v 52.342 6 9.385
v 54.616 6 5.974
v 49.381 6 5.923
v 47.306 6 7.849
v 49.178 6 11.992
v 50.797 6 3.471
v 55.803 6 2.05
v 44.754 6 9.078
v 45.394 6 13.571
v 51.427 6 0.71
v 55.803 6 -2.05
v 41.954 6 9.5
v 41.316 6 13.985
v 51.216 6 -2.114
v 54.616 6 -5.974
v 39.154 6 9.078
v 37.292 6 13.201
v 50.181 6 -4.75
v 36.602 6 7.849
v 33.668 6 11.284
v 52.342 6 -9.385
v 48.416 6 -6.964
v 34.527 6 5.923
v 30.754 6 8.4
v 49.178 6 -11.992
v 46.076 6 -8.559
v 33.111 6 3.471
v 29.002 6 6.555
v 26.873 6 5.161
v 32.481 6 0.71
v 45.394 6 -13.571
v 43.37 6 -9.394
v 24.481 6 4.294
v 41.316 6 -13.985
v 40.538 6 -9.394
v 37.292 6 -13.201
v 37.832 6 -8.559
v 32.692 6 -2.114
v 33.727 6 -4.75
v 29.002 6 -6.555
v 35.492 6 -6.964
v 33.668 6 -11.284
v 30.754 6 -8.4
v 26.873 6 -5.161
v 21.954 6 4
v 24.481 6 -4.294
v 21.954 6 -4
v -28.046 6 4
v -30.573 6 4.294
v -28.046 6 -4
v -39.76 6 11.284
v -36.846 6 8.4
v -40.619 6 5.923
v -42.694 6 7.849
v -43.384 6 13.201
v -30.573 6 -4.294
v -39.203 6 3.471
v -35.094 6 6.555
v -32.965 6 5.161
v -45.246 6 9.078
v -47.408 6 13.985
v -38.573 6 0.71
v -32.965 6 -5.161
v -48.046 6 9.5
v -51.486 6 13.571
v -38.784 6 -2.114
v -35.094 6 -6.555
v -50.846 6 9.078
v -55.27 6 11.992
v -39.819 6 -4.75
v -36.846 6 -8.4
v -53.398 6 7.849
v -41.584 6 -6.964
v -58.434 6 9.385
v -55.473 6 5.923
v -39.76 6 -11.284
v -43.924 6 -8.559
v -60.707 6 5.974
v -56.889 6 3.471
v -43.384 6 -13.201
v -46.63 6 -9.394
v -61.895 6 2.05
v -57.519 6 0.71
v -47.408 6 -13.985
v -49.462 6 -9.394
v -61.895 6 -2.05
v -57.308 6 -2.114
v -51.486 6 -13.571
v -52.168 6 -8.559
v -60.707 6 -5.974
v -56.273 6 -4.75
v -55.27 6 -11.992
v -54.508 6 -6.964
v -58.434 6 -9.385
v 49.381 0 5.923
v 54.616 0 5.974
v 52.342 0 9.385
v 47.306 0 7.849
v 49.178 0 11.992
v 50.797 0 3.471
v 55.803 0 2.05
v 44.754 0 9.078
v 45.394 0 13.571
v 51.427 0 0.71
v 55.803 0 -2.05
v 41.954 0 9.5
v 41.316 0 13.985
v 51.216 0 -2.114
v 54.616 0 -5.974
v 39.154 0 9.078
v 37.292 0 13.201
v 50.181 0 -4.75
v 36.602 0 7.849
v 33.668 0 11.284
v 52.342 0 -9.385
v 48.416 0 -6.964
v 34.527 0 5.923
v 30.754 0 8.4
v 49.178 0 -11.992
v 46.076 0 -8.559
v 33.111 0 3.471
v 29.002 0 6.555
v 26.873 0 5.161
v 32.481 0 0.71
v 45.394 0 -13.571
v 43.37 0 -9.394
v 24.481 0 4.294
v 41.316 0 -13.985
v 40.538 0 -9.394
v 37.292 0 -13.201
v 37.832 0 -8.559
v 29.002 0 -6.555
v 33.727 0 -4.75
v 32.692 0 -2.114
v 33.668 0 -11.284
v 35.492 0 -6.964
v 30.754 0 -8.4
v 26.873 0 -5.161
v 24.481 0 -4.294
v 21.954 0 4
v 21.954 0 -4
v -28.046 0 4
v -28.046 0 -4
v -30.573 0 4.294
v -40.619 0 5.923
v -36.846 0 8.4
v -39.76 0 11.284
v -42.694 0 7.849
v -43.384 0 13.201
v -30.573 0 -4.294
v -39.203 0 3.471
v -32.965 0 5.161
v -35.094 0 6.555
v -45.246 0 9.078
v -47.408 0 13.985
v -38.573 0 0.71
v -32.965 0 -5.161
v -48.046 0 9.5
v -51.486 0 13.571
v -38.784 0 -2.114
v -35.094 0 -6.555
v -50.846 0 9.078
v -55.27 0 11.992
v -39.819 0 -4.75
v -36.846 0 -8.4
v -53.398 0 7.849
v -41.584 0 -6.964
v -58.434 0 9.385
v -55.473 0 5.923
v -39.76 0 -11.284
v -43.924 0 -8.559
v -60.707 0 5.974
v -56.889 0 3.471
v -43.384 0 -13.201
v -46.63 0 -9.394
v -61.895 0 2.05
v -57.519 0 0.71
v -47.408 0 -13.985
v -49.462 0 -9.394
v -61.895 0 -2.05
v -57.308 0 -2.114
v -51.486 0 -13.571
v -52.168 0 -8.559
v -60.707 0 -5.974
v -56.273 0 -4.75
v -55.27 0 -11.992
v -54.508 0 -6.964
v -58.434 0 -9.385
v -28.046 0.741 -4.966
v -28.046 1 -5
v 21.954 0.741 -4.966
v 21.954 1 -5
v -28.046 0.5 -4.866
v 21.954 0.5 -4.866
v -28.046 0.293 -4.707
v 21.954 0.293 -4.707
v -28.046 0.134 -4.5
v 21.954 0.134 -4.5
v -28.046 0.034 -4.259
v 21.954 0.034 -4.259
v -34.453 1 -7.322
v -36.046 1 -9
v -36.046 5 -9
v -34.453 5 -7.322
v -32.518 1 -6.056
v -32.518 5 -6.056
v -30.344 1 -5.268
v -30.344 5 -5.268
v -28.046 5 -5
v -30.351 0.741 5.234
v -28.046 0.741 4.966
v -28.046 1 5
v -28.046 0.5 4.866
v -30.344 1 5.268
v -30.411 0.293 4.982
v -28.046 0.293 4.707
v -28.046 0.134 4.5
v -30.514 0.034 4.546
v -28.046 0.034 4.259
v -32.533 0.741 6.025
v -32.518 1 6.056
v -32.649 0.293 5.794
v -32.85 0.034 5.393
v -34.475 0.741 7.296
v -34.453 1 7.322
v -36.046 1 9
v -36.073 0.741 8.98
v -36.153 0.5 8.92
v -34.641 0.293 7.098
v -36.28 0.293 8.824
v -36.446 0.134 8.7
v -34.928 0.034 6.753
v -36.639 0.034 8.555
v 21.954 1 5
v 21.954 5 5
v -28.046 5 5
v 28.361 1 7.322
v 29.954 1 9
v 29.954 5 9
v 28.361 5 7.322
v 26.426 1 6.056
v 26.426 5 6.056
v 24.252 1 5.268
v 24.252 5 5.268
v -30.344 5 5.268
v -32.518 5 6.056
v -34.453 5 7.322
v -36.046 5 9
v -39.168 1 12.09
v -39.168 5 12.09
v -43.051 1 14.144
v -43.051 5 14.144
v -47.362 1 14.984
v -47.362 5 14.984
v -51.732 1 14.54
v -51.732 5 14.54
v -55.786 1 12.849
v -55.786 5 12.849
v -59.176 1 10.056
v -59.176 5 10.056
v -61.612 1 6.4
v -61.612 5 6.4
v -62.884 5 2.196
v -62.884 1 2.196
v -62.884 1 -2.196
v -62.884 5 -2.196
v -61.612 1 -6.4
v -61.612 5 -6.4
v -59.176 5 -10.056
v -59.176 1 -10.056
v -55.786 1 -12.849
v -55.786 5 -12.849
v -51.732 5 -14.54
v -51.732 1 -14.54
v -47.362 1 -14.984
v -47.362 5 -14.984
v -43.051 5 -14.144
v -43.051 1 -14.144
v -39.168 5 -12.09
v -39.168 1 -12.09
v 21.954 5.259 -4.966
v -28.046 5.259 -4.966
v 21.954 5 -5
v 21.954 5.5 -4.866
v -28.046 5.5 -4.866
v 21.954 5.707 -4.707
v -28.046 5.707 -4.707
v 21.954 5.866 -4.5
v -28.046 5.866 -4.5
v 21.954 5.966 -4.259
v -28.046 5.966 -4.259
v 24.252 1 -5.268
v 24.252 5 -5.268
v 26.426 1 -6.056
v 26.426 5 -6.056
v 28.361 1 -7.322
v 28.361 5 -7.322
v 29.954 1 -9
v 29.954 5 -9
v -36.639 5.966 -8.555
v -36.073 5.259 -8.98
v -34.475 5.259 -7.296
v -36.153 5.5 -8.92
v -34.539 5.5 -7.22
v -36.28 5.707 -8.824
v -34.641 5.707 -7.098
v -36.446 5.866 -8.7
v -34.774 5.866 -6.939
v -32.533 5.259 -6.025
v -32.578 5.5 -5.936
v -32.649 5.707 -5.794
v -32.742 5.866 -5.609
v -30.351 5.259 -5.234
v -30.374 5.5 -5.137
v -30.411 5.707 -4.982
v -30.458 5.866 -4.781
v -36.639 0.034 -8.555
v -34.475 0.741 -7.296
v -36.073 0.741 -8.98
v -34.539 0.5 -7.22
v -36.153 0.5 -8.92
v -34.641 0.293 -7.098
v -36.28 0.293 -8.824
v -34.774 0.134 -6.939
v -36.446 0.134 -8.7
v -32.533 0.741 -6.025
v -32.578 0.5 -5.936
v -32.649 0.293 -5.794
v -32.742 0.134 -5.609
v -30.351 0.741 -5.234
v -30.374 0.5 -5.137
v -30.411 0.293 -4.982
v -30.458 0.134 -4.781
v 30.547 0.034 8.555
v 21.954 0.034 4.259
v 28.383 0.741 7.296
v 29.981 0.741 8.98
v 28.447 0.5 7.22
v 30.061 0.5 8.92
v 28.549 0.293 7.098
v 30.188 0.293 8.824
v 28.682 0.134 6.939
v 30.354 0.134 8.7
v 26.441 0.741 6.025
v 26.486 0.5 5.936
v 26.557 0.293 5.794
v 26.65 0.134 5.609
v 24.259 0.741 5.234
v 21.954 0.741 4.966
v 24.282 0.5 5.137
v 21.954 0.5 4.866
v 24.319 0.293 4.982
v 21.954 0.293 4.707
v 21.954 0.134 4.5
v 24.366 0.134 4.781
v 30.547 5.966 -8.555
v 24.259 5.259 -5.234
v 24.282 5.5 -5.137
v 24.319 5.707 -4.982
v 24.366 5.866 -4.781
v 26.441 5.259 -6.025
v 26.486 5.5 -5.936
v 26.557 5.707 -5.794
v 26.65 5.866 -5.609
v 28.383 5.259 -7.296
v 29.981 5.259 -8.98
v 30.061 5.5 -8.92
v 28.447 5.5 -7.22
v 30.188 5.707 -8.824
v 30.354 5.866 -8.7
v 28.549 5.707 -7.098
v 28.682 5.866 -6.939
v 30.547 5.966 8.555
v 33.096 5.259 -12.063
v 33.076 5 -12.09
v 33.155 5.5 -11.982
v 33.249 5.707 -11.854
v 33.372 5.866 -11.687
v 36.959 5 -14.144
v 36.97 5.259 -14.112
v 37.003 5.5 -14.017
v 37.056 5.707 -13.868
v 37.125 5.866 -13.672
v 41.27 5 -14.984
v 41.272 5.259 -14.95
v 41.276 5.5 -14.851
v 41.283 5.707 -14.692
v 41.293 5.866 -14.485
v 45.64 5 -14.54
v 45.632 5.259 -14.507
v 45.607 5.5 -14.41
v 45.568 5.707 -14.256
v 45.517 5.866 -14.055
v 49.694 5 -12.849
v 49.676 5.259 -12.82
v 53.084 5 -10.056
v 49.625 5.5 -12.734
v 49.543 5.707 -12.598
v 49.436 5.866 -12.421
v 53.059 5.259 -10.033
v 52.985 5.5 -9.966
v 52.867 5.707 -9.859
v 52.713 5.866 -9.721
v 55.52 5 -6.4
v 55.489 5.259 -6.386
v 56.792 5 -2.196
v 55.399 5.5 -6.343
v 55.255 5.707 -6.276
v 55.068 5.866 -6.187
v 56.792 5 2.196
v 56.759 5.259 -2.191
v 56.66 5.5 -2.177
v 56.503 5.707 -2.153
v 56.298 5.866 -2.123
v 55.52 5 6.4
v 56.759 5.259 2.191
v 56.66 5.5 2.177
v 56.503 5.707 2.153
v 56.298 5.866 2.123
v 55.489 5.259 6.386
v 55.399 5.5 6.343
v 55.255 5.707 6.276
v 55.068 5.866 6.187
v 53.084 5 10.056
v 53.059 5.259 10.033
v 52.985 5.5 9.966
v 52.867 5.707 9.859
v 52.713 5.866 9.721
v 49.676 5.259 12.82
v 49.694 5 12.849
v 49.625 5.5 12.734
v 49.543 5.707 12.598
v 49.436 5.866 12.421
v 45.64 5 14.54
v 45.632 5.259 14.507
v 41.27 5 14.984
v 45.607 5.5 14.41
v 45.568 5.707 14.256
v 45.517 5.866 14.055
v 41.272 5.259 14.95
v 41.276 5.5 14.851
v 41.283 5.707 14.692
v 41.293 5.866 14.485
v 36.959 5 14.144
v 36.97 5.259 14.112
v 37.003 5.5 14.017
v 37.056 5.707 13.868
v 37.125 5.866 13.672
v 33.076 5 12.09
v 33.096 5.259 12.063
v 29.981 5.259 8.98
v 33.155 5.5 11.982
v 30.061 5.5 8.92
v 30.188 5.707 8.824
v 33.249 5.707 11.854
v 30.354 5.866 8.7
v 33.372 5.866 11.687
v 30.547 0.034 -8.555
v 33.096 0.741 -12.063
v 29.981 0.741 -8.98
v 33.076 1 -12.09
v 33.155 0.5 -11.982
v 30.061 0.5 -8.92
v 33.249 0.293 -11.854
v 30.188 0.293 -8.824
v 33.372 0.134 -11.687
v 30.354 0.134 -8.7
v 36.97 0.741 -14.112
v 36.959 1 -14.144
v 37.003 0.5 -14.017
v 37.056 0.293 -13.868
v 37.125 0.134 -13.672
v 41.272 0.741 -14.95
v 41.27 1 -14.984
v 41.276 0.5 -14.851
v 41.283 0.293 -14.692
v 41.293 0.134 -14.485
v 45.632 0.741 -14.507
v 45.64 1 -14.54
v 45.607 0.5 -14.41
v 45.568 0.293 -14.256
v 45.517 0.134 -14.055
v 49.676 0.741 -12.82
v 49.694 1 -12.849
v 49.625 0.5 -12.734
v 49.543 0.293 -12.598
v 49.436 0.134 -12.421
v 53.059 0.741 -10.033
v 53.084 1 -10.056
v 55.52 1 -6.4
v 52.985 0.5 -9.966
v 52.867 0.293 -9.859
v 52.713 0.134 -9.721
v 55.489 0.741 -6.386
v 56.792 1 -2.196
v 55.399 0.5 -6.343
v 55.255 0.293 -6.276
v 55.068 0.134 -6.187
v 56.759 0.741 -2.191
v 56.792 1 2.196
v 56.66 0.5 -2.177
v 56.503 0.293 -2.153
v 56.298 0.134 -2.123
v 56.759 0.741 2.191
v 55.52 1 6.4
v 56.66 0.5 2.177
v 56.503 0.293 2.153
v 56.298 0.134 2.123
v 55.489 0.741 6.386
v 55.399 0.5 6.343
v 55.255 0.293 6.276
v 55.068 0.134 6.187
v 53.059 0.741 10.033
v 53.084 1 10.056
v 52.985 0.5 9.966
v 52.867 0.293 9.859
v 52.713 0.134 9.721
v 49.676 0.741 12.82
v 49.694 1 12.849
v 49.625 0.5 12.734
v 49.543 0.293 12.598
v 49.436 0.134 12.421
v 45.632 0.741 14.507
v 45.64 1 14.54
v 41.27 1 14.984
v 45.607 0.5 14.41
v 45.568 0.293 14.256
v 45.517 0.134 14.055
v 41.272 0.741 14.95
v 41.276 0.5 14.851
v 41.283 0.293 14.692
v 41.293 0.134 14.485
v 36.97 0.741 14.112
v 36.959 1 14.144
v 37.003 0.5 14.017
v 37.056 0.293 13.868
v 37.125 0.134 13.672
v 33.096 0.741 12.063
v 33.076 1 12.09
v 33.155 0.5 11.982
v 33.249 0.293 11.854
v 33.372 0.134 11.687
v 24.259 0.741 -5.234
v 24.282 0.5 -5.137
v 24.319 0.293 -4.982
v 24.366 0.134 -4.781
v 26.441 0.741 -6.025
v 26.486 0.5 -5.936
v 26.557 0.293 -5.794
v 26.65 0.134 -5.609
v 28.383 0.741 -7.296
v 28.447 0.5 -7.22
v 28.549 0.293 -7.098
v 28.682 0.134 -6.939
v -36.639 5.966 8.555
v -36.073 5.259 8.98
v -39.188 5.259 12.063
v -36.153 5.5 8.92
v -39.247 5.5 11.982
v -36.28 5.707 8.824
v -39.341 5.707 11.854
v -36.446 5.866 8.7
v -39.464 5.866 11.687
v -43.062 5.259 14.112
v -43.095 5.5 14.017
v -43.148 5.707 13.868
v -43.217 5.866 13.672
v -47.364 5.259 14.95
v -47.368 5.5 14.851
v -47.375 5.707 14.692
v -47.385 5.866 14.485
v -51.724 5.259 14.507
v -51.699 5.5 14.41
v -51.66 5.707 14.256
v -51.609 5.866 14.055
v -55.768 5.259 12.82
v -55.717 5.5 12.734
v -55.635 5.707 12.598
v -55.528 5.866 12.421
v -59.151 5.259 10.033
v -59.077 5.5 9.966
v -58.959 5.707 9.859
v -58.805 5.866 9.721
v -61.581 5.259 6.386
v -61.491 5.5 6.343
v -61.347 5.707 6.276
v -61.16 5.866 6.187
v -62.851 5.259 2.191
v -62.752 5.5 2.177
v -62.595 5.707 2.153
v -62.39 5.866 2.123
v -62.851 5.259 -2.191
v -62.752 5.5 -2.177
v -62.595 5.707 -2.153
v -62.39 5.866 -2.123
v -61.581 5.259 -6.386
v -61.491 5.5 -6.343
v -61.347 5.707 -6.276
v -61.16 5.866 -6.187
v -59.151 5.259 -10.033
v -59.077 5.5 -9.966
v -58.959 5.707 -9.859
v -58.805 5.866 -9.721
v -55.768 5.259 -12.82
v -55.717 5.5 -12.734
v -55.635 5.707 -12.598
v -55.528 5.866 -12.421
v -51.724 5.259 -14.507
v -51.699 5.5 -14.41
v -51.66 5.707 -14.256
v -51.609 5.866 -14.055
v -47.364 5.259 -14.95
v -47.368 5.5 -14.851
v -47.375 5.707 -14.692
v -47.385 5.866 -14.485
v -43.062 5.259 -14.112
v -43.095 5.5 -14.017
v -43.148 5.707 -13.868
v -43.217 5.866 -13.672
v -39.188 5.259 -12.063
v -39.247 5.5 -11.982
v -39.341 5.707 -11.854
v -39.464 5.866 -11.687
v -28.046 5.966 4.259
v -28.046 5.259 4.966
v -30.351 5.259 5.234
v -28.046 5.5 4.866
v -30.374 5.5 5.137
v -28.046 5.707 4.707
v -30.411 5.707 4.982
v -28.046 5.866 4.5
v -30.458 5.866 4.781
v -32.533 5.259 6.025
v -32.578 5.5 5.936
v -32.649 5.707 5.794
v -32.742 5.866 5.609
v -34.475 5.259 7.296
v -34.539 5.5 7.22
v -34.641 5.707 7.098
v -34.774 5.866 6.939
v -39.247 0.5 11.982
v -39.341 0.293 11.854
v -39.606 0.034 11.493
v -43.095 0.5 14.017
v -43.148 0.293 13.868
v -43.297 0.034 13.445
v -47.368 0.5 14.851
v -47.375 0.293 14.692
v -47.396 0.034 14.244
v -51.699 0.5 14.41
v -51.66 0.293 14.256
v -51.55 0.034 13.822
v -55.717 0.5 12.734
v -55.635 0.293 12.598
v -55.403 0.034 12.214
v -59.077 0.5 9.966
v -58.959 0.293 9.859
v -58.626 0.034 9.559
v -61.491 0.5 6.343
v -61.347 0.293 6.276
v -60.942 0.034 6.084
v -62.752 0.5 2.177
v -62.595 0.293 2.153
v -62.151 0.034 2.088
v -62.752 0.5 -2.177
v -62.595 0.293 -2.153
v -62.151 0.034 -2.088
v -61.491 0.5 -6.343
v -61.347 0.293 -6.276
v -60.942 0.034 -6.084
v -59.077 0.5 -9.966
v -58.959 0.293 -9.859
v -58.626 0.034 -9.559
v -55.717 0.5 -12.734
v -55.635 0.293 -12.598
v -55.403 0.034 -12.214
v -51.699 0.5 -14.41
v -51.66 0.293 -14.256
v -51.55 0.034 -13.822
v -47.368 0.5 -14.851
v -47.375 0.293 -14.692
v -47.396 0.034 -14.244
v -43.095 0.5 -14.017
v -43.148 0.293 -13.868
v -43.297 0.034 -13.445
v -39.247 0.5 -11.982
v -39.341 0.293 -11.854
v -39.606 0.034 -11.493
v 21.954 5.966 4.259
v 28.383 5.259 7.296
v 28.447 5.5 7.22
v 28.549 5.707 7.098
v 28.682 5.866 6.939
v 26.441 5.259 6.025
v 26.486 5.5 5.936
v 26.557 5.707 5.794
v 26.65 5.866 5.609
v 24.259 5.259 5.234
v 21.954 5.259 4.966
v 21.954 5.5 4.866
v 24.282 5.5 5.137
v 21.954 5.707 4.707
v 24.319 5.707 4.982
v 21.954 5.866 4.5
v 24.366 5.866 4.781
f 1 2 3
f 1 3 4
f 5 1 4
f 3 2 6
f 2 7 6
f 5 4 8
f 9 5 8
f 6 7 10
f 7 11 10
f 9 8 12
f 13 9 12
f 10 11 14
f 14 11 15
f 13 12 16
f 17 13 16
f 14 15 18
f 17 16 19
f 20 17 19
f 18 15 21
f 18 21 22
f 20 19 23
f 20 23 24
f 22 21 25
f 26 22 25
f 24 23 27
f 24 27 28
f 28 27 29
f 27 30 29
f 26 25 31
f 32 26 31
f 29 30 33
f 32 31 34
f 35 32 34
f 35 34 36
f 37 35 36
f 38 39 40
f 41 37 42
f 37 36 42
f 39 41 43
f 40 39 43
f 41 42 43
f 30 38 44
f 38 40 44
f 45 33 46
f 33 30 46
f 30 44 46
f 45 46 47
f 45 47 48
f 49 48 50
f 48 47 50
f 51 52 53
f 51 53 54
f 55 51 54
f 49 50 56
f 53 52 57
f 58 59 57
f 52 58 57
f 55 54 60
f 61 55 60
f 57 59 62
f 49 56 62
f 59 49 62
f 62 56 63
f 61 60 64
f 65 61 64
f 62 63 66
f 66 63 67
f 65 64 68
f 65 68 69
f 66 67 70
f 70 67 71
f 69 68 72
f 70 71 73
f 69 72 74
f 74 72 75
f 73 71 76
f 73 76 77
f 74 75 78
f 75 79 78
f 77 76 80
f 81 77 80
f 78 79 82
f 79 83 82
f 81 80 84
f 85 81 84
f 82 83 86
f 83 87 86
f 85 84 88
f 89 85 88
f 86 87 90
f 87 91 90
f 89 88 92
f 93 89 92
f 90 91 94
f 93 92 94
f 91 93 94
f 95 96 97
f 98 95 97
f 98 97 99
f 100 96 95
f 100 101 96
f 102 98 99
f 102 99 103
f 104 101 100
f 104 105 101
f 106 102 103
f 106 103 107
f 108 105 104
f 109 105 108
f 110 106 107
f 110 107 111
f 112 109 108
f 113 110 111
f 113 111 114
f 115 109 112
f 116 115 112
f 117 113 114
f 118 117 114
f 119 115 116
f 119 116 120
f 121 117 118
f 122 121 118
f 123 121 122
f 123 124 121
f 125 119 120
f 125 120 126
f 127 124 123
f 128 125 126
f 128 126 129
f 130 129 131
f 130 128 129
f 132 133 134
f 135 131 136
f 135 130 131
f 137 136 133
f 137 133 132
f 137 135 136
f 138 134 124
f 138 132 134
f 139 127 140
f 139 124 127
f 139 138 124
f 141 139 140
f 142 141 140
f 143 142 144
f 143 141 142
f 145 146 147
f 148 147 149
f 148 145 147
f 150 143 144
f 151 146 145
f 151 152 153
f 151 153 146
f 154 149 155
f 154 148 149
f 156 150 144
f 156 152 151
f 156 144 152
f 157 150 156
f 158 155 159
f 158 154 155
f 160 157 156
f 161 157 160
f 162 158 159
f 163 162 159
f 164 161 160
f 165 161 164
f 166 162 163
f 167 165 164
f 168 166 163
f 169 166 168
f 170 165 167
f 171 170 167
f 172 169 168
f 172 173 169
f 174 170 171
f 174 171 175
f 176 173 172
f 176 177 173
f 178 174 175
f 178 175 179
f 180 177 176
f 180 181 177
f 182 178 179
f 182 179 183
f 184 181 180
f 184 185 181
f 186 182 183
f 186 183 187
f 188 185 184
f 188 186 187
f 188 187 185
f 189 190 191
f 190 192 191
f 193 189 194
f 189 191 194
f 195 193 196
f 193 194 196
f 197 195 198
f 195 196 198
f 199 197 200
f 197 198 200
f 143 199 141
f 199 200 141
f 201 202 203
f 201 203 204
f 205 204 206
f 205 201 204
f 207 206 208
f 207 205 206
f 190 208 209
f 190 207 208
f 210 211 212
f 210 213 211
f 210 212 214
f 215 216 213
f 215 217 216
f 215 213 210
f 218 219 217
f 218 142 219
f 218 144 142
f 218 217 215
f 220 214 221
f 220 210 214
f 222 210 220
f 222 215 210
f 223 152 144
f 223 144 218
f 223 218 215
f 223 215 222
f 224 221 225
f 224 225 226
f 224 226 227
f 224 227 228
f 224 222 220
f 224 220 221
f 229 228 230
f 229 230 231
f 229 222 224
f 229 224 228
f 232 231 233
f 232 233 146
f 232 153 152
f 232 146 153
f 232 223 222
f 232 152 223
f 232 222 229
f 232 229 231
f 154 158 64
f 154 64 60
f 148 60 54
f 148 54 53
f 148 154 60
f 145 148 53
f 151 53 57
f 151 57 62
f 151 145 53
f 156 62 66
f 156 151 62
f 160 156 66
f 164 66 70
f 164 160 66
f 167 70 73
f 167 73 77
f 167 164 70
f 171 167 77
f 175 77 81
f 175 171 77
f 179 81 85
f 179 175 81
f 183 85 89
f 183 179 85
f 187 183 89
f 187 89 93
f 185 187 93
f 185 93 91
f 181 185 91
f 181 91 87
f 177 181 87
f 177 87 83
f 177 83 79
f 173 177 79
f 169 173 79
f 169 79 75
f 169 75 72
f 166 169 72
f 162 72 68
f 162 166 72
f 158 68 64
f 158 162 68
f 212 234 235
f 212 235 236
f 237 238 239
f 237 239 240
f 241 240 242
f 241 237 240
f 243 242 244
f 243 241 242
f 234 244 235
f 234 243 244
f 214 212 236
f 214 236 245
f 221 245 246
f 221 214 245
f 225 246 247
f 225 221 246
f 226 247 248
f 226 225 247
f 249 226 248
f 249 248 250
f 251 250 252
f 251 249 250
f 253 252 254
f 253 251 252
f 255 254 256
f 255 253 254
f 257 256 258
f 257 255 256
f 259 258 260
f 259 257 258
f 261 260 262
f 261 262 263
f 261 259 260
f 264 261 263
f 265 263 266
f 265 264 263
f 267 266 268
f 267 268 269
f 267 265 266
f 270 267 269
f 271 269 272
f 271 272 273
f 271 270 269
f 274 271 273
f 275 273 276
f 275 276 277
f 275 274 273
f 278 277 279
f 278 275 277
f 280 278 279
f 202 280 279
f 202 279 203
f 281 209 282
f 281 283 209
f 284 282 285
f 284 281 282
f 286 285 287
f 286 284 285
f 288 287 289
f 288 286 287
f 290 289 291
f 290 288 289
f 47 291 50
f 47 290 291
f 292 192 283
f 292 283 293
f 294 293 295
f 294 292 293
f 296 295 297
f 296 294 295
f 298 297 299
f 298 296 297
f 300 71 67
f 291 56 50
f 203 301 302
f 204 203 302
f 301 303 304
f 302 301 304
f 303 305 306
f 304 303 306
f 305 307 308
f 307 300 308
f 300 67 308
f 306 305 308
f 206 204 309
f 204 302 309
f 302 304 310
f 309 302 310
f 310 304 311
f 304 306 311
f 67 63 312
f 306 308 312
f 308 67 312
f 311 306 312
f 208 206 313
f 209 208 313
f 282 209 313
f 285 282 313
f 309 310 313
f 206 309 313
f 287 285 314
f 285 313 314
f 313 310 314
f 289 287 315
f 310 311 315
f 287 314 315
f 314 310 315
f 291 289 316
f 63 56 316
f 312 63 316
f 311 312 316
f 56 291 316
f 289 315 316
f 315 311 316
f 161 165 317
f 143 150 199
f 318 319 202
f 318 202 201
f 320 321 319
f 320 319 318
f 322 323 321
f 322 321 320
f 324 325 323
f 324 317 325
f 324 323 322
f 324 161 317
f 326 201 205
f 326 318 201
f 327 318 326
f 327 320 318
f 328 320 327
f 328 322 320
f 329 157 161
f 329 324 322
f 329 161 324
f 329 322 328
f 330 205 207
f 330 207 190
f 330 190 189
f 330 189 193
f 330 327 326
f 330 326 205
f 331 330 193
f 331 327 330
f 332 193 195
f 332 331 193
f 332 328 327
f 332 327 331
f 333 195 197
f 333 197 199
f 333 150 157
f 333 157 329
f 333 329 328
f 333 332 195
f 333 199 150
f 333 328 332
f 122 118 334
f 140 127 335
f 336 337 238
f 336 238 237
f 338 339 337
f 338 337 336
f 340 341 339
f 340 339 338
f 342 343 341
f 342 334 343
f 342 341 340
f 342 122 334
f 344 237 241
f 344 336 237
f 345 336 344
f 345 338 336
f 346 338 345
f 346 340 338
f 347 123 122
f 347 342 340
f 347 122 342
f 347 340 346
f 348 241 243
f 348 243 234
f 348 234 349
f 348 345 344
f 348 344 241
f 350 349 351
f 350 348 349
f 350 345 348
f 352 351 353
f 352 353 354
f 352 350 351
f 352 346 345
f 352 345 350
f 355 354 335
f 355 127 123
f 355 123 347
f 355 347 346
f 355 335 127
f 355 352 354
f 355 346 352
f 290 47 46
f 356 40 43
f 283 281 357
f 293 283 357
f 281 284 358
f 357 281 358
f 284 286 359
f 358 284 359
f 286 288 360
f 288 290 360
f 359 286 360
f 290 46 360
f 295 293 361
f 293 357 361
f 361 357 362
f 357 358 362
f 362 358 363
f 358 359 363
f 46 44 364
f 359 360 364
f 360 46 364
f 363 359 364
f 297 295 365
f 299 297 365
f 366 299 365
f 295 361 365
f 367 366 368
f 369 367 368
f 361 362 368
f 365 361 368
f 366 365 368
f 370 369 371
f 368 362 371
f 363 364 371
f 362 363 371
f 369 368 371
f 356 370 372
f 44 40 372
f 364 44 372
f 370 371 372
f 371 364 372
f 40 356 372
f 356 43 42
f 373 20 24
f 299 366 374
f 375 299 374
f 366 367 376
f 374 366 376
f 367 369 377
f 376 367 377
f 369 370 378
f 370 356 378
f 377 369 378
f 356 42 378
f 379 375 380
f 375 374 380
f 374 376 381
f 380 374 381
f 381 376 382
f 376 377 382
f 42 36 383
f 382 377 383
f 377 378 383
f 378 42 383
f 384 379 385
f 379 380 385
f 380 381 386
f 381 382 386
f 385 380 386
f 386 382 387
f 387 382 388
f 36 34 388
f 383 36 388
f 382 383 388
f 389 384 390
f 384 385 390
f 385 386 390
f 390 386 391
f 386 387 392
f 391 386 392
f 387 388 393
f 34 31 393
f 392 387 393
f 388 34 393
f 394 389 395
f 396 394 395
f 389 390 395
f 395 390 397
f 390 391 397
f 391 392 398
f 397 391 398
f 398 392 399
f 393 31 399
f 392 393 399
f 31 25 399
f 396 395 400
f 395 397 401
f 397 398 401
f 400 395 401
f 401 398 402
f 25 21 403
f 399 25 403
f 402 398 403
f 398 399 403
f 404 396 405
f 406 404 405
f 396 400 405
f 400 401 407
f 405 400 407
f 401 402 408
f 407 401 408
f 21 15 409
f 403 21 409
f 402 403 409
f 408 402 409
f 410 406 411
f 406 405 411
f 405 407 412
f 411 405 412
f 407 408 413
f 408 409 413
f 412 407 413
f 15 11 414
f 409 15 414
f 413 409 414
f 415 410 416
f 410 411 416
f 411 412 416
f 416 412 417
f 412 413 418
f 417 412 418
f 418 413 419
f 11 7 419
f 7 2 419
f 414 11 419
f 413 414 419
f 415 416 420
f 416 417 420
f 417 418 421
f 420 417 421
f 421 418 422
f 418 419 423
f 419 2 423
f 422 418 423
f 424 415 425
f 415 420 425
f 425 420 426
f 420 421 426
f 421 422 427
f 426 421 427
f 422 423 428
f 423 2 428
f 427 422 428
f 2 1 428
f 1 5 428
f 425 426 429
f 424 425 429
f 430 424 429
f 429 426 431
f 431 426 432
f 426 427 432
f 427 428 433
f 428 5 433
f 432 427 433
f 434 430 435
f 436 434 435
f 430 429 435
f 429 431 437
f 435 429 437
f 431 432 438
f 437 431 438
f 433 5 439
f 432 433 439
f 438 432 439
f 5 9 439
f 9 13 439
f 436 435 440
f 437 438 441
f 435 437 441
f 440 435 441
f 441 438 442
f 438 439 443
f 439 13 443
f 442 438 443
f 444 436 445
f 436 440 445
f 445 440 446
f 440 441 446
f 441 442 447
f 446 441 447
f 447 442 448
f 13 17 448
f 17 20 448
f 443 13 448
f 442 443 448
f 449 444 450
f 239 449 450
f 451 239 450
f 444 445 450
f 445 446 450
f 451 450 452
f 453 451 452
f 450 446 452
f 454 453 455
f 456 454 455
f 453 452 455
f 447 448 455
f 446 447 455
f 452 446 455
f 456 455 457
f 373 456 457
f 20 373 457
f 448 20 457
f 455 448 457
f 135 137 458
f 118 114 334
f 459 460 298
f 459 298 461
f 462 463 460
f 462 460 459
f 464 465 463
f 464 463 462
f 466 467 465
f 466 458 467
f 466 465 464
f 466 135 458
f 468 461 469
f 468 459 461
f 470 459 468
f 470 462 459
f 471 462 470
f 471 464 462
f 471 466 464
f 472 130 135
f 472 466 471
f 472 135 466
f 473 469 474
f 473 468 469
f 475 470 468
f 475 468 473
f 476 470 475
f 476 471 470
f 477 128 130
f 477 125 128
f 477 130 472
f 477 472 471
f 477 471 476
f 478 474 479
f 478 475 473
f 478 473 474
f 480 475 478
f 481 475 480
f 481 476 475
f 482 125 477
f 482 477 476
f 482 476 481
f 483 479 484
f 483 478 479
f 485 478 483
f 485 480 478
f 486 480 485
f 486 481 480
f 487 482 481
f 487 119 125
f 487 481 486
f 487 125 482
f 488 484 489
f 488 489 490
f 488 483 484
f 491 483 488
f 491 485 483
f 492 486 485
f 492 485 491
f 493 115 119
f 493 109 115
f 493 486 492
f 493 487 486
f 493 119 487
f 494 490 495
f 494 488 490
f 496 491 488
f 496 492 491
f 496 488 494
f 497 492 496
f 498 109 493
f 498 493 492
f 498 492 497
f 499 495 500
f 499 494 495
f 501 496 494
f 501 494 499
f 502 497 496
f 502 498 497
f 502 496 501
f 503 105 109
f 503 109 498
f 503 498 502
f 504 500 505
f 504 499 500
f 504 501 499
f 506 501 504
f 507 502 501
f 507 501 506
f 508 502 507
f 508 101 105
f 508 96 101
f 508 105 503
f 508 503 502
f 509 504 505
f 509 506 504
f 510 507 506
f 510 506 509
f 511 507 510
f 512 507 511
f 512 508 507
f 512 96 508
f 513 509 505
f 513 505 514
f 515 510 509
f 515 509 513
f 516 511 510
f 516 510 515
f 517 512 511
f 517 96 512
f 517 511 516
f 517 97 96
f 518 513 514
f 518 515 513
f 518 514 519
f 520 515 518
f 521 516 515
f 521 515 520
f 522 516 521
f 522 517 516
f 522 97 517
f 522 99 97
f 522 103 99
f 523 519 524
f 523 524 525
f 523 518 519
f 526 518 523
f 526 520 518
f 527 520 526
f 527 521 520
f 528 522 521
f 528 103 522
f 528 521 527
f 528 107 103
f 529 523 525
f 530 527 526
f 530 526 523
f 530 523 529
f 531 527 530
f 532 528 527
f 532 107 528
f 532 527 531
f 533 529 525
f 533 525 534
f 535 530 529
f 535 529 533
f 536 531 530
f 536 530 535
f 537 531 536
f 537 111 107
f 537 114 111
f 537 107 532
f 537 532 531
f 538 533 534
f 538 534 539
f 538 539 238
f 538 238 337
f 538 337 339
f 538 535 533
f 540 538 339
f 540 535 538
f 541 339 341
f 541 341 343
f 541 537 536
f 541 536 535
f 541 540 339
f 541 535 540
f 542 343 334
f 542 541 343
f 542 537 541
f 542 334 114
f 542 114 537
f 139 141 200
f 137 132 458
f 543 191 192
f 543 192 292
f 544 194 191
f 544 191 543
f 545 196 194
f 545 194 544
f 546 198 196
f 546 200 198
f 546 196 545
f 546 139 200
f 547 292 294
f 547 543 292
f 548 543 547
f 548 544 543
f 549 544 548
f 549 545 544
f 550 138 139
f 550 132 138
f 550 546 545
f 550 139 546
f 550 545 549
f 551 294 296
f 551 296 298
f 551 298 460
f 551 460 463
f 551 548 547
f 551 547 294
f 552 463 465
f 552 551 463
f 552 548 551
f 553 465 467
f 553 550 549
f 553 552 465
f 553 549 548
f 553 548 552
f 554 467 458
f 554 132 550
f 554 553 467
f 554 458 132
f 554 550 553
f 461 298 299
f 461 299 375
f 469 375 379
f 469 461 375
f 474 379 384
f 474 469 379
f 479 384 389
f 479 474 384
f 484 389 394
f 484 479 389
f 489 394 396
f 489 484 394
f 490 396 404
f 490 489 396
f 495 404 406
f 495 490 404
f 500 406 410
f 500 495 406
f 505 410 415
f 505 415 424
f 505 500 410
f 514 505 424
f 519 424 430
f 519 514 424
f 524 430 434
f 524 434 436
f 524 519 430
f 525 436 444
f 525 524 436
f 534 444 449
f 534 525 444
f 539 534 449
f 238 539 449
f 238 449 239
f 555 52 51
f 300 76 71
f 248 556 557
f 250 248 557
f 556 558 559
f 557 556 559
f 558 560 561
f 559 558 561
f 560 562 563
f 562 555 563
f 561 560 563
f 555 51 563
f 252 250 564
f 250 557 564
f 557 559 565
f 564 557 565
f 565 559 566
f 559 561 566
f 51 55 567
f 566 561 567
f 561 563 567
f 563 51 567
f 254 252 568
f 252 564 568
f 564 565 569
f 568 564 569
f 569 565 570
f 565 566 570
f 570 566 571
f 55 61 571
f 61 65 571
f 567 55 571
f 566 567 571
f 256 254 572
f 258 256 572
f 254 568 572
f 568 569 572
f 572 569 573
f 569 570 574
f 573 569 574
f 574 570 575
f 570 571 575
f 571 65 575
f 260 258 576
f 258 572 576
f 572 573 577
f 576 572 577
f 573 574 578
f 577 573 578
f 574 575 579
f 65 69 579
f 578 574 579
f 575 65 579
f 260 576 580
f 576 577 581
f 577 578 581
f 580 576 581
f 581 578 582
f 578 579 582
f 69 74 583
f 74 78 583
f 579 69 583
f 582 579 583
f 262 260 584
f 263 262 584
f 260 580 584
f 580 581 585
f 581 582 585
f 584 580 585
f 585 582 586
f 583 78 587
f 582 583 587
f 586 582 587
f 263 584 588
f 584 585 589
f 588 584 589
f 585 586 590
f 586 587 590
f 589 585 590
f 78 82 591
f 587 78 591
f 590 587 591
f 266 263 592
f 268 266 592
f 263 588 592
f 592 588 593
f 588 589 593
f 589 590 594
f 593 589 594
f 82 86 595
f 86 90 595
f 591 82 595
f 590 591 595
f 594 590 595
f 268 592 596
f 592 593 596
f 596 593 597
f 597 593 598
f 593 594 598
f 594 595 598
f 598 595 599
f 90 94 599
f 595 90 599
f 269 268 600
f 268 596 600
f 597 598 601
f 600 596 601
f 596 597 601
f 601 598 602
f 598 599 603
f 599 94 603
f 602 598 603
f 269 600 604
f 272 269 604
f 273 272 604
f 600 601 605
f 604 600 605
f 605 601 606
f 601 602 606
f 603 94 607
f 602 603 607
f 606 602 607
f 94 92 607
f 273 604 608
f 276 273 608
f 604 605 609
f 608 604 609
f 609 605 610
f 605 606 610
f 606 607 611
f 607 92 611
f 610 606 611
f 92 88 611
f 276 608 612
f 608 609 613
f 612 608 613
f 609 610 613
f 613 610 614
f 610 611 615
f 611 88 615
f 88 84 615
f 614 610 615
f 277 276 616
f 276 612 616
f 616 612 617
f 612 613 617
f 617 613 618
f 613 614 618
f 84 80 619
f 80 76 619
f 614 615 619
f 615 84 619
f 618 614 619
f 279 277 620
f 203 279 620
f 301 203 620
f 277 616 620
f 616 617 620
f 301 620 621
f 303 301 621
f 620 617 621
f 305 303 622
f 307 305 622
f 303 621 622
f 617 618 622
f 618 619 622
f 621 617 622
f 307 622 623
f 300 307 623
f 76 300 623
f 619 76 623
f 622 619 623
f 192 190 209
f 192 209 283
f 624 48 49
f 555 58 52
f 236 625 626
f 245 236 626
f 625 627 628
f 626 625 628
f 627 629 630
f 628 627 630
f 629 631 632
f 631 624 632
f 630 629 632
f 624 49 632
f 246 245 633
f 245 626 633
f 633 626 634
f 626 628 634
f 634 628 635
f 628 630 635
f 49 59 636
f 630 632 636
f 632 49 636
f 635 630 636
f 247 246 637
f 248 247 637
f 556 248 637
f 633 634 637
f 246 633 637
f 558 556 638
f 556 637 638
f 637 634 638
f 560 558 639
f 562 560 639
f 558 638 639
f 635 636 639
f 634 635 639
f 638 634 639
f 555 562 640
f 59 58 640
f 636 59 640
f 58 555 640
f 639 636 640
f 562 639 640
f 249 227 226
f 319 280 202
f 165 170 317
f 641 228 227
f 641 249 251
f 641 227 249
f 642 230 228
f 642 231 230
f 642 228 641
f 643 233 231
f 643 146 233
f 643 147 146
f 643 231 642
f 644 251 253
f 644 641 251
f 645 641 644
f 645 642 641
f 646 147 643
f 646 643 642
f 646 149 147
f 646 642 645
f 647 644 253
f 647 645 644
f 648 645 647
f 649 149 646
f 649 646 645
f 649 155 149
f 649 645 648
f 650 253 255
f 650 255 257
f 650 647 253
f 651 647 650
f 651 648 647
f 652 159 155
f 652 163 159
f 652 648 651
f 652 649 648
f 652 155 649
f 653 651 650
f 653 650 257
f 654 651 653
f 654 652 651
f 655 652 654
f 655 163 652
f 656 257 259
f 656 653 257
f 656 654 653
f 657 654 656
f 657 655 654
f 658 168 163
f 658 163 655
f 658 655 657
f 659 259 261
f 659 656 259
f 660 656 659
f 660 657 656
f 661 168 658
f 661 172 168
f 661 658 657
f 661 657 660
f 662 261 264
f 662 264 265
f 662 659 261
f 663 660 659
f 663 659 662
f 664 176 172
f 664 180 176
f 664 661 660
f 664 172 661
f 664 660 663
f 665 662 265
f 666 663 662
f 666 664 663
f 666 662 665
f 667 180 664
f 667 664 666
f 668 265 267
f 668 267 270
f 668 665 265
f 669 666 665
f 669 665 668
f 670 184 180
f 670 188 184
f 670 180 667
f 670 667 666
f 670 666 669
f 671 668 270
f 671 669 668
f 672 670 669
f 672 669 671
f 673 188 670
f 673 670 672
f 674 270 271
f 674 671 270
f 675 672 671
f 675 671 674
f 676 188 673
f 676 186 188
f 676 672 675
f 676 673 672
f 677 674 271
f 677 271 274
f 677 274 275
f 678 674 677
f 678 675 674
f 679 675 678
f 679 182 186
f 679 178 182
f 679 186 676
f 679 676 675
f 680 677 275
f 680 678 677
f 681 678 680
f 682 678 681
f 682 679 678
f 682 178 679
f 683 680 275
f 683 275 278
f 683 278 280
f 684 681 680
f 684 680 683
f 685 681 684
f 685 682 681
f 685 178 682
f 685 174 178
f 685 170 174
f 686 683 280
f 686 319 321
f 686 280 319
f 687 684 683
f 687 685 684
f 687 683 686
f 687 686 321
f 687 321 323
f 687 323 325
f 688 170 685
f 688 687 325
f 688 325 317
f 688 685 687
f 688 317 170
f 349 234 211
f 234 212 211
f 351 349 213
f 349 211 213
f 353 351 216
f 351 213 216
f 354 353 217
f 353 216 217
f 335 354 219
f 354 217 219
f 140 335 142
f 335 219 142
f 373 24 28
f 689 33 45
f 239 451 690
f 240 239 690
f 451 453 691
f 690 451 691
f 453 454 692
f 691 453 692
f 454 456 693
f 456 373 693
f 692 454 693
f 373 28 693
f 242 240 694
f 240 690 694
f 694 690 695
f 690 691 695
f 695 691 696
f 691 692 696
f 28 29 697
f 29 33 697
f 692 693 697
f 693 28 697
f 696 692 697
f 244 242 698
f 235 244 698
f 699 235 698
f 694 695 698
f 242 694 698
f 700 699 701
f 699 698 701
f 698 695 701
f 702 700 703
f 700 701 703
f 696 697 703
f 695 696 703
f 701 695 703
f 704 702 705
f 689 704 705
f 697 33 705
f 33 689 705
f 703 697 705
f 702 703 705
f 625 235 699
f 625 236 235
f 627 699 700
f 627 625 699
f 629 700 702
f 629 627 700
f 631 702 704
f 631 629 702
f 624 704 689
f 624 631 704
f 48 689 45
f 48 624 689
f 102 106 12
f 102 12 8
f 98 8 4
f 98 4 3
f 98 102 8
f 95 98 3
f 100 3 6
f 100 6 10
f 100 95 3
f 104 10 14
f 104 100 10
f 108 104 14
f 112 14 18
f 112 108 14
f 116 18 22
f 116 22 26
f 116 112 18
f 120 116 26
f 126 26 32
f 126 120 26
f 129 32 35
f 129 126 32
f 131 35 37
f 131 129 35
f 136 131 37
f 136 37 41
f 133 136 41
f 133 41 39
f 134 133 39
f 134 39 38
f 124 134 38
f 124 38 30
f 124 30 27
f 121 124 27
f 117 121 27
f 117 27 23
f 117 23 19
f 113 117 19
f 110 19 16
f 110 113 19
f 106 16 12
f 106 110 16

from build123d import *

# Parameters (mm, degrees)
SKETCH1_R           = 9.5
BOSS_EXTRUDE1_DEPTH = 6
FILLET1_R           = 1


with BuildPart() as part:
    # Sketch1 → Boss-Extrude1 (new body)
    with BuildSketch(Plane(origin=(0, 0, 0), x_dir=(1, 0, 0), z_dir=(0, 1, 0))):
        with BuildLine():
            Line((-28.045977011, 5), (21.954022989, 5))
            ThreePointArc((21.954022989, 5), (26.426158944, 6.05572809), (29.954022989, 9))
            ThreePointArc((29.954022989, 9), (56.954022989, 0), (29.954022989, -9))
            ThreePointArc((29.954022989, -9), (26.426158944, -6.05572809), (21.954022989, -5))
            Line((21.954022989, -5), (-28.045977011, -5))
            ThreePointArc((-28.045977011, -5), (-32.518112966, -6.05572809), (-36.045977011, -9))
            ThreePointArc((-36.045977011, -9), (-63.045977011, 0), (-36.045977011, 9))
            ThreePointArc((-36.045977011, 9), (-32.518112966, 6.05572809), (-28.045977011, 5))
        make_face()
        with Locations(Location((-48.045977011, 0, 0), (0, 0, 270))):
            Circle(SKETCH1_R, mode=Mode.SUBTRACT)
        with Locations(Location((41.954022989, 0, 0), (0, 0, 270))):
            Circle(SKETCH1_R, mode=Mode.SUBTRACT)
    extrude(amount=BOSS_EXTRUDE1_DEPTH)

    # Fillet1
    fillet1_edges = [part.edges().sort_by_distance(p)[0] for p in [
        (-63.045977011, 0, 0),
        (-32.518112966, 0, -6.05572809),
        (-3.045977011, 0, -5),
        (26.426158944, 0, -6.05572809),
        (-32.518112966, 6, -6.05572809),
        (-63.045977011, 6, 0),
        (-32.518112966, 6, 6.05572809),
        (-3.045977011, 6, 5),
        (26.426158944, 6, 6.05572809),
        (56.954022989, 6, 0),
        (26.426158944, 6, -6.05572809),
        (56.954022989, 0, 0),
        (-3.045977011, 6, -5),
        (26.426158944, 0, 6.05572809),
        (-3.045977011, 0, 5),
        (-32.518112966, 0, 6.05572809),
    ]]
    fillet(fillet1_edges, radius=FILLET1_R)


solid = part.part
